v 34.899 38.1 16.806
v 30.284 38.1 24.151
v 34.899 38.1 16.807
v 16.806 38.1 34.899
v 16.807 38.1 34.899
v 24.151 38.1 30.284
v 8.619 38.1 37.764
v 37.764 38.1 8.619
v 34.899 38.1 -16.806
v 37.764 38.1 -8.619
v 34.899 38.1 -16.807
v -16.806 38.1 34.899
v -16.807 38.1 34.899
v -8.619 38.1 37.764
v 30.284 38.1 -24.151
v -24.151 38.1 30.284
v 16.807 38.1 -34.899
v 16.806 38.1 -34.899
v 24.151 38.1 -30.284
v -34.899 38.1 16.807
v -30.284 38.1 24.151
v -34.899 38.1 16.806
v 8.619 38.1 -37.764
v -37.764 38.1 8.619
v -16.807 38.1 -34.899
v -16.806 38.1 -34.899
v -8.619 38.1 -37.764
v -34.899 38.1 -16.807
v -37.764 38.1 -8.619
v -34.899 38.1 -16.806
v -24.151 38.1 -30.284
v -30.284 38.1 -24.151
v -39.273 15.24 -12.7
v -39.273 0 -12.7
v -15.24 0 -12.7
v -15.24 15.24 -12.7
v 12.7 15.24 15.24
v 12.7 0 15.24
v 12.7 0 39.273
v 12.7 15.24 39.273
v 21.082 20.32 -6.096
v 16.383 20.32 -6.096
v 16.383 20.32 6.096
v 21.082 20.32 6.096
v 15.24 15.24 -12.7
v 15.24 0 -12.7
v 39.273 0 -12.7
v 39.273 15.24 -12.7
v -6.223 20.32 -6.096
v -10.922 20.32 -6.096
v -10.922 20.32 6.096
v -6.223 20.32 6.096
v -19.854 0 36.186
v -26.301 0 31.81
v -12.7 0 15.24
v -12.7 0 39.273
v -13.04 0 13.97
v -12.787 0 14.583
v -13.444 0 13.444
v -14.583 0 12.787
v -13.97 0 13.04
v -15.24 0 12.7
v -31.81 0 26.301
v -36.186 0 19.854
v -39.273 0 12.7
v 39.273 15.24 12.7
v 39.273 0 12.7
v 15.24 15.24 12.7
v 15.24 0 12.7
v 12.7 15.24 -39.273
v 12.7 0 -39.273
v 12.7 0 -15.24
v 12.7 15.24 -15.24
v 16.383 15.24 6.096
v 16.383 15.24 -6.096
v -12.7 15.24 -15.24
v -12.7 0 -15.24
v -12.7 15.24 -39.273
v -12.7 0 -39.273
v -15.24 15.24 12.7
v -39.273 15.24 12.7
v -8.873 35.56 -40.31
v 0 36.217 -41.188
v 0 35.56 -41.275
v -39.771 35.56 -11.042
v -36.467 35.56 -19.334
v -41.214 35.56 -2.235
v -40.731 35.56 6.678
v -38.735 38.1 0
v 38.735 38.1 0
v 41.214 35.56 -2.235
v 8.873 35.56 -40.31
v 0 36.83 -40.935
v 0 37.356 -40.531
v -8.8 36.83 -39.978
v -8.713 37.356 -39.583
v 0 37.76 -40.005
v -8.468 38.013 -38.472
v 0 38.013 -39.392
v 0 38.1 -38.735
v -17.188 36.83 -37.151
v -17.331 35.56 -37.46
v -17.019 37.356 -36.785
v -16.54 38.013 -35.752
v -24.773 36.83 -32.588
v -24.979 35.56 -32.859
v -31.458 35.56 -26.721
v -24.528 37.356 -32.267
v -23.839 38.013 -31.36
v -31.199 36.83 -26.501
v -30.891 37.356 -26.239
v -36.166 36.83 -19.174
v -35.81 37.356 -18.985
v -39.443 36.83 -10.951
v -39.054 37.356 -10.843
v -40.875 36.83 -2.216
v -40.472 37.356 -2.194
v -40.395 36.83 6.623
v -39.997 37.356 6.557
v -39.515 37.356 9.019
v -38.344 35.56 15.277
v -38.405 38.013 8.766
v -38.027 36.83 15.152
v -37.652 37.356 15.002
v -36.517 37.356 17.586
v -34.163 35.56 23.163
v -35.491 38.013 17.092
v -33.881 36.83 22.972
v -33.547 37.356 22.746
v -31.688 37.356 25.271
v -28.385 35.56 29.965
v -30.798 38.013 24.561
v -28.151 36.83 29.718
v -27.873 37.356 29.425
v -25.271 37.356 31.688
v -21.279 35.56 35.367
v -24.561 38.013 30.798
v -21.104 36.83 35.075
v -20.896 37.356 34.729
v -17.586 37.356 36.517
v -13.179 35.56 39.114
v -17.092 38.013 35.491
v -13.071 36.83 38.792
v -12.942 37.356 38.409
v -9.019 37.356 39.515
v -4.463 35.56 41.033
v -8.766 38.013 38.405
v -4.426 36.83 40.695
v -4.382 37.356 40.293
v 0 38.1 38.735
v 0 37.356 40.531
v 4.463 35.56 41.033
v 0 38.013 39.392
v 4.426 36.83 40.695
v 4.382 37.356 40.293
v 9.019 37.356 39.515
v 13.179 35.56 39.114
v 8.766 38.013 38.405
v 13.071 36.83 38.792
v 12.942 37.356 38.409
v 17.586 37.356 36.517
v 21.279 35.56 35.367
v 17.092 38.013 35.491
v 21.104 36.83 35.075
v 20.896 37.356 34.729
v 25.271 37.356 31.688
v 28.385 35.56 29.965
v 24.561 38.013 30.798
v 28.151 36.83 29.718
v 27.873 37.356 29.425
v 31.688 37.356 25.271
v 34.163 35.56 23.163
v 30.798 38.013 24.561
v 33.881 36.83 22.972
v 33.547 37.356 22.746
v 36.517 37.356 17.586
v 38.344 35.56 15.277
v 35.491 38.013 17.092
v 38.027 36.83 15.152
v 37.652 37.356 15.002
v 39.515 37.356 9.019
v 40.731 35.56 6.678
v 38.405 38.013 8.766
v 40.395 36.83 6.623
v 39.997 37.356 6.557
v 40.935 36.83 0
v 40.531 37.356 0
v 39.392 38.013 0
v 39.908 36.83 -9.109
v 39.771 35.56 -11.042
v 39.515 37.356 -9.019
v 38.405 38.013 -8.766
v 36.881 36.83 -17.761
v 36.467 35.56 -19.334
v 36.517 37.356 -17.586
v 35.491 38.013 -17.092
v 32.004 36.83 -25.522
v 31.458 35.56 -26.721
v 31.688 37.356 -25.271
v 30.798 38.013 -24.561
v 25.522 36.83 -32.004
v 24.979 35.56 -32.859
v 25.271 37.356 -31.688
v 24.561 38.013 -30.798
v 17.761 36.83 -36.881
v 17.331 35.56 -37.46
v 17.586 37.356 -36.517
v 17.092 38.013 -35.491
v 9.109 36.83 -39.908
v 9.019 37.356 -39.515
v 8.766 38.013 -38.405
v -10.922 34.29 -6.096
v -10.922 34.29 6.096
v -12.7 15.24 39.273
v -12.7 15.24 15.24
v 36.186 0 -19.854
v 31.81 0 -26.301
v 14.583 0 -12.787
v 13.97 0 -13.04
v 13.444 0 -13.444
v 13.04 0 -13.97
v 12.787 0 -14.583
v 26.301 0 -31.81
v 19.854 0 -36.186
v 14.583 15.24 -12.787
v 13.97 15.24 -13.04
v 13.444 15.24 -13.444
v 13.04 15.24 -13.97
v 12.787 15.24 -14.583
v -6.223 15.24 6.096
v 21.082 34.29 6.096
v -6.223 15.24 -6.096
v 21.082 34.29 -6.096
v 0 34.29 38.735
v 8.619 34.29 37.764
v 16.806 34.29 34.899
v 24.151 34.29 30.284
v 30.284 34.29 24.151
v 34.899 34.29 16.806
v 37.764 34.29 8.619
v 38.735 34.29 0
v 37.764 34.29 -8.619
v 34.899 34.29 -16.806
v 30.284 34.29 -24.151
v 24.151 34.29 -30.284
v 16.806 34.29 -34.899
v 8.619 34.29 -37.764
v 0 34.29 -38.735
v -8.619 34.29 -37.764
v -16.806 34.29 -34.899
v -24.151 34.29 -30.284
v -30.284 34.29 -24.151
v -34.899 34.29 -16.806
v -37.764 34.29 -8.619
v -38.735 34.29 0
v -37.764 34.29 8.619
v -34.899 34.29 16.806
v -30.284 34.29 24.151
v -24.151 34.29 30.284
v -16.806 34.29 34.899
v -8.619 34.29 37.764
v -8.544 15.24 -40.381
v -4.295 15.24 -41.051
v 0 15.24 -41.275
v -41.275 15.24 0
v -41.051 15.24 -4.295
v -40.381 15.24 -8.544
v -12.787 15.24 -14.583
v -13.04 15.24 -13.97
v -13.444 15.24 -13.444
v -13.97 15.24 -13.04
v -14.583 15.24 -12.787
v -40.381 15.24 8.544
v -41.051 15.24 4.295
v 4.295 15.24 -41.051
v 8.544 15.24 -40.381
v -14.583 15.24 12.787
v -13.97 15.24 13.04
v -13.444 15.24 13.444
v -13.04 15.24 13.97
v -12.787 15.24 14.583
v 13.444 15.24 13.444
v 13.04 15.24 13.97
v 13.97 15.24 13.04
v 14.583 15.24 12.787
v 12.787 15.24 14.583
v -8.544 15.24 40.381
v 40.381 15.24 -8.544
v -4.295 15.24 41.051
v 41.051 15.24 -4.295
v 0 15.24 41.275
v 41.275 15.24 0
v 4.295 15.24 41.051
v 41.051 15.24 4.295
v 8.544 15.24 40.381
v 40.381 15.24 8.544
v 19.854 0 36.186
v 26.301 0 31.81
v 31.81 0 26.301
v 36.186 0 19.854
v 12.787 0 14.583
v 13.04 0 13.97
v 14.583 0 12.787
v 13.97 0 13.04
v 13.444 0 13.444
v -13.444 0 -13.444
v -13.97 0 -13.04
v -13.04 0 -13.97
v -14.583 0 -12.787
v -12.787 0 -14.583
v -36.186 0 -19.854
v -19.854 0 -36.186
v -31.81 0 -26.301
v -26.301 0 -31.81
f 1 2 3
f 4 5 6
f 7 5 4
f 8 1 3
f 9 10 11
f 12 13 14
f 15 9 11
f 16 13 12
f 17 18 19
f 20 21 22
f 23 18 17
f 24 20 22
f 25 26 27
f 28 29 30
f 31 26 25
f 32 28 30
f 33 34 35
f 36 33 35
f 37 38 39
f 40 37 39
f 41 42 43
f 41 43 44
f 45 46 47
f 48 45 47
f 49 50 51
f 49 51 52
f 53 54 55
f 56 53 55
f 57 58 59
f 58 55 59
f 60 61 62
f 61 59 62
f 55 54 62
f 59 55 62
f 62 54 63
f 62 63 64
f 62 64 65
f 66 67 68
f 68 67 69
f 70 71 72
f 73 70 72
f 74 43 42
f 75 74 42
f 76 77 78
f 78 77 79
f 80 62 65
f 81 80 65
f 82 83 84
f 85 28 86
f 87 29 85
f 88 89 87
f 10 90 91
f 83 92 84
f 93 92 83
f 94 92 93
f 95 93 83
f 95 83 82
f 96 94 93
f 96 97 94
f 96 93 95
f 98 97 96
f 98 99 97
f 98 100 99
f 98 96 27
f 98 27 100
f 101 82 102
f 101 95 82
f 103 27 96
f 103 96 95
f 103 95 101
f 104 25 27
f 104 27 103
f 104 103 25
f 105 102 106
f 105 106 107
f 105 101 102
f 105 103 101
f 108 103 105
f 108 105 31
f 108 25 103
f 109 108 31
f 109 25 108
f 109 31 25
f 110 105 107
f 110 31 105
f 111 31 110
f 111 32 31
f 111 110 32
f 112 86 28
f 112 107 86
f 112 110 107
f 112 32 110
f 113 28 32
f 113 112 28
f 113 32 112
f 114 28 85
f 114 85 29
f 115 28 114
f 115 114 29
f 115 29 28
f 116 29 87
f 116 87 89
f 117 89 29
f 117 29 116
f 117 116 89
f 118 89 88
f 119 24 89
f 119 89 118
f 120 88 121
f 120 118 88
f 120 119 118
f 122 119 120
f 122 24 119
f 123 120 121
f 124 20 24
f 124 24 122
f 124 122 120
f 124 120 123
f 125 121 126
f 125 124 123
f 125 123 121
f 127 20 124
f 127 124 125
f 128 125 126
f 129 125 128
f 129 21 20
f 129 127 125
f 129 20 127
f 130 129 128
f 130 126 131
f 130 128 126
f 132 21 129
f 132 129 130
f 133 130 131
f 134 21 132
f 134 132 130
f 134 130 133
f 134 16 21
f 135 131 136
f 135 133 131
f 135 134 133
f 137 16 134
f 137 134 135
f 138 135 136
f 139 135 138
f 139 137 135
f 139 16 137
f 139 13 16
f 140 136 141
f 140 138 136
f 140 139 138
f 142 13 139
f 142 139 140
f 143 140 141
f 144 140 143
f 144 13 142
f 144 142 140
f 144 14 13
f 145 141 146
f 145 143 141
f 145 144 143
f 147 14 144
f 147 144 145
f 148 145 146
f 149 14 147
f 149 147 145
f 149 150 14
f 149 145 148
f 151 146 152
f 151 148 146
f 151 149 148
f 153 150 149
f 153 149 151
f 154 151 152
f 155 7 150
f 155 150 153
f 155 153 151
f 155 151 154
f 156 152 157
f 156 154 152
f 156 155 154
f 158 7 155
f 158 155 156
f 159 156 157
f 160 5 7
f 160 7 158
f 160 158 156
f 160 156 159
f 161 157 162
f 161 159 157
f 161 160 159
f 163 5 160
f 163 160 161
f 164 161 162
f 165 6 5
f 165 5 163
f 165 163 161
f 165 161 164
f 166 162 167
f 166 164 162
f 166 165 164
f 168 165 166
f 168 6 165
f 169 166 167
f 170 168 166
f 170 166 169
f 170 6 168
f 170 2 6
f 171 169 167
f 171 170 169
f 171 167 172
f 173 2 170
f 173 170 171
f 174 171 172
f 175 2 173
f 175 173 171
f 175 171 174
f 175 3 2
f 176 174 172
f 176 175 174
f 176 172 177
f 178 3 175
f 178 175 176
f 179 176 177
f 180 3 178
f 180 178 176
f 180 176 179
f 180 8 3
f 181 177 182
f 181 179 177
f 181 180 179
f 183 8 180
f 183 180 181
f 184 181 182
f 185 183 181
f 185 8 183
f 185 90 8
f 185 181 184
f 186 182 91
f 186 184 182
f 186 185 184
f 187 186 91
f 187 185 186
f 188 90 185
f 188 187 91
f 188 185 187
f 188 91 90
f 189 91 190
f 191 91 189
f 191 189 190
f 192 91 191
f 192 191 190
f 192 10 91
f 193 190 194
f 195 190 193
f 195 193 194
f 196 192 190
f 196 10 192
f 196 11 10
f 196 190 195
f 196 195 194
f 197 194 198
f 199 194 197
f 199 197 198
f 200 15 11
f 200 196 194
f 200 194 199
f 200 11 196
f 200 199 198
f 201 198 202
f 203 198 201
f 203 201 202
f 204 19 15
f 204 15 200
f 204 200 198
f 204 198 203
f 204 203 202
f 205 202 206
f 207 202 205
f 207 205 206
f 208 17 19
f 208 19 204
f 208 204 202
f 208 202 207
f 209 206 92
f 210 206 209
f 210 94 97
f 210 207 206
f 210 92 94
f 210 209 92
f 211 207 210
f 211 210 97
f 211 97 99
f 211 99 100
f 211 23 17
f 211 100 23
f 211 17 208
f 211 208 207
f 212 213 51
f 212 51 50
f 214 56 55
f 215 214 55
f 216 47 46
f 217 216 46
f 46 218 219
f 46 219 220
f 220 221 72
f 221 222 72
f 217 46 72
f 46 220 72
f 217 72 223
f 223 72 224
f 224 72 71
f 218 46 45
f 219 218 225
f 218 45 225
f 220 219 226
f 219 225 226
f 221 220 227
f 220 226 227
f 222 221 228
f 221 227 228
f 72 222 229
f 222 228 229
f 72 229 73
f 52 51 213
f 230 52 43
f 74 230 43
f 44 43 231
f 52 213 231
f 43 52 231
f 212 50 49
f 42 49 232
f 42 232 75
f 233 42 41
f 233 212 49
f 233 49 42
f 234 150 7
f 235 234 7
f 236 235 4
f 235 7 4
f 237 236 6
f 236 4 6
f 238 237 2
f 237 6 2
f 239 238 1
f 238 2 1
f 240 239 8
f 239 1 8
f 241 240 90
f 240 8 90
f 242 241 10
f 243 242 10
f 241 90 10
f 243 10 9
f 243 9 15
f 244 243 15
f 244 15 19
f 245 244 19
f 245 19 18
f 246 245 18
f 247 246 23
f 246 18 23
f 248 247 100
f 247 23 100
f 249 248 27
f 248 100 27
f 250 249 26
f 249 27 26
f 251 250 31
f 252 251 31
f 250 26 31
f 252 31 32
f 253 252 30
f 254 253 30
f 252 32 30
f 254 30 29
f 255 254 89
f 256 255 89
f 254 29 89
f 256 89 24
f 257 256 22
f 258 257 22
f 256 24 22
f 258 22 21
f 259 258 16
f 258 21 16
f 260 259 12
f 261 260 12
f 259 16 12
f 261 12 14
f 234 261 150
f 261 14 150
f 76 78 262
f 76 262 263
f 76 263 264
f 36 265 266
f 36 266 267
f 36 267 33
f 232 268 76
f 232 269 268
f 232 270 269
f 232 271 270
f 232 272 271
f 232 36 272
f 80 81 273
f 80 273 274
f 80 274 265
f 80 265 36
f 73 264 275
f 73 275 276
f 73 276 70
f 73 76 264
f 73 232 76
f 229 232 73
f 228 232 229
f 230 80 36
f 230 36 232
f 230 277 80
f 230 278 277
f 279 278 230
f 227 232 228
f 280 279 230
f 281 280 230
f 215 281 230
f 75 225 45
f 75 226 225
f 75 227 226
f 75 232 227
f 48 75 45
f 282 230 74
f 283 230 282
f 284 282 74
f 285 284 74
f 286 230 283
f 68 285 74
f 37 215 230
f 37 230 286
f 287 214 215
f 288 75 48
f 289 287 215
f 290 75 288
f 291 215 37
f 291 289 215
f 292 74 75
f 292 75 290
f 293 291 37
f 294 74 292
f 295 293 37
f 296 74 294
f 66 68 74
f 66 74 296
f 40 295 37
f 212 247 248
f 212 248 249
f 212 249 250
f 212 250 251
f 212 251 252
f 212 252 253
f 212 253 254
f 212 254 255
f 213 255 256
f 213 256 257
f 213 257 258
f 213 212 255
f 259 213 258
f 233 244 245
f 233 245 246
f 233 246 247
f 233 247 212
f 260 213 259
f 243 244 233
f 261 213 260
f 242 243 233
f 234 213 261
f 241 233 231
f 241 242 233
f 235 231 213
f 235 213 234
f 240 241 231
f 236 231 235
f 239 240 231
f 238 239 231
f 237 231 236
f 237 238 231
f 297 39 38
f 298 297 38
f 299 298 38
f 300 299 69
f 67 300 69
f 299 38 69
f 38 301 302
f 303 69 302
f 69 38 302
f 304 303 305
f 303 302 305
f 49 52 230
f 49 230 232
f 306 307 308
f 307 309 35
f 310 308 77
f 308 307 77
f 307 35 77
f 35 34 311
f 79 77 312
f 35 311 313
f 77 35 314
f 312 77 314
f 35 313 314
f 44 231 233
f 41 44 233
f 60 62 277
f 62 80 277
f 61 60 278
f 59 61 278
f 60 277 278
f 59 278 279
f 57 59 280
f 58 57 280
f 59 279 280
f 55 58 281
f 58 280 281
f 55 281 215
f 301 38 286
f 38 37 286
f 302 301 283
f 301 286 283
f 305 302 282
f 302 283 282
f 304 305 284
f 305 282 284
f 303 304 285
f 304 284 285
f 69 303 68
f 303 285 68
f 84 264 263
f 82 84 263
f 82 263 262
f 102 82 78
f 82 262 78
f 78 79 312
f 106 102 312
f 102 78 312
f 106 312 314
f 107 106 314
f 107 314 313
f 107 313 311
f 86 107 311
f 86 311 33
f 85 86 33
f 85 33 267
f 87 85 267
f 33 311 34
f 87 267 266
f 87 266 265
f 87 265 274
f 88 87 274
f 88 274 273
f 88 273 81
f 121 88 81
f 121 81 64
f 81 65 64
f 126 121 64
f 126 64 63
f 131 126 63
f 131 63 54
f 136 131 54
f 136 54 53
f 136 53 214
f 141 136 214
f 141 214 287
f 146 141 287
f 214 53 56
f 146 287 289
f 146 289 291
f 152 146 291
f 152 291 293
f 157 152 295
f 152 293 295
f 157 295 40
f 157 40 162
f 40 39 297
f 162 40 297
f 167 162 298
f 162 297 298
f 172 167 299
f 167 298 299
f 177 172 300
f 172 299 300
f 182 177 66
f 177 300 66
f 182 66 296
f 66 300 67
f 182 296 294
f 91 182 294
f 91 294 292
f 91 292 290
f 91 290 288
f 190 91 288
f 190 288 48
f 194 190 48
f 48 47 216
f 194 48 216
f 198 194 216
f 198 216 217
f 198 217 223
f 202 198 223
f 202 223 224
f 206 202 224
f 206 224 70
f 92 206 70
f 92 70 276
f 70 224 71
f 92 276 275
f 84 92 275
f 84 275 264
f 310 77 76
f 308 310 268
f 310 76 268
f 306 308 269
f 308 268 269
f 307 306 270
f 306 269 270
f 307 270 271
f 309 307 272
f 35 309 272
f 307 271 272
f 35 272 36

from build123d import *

# Parameters (mm, degrees)
SKETCH2_R           = 41.275
BOSS_EXTRUDE2_DEPTH = 38.1
SKETCH3_R           = 38.735
CUT_EXTRUDE1_DEPTH  = 3.81
SKETCH4_W           = 25.4
SKETCH4_H           = 25.4
CUT_EXTRUDE2_DEPTH  = 15.24
SKETCH5_W           = 32.004
SKETCH5_H           = 12.192
CUT_EXTRUDE3_DEPTH  = 13.97
SKETCH6_W           = 22.606
SKETCH6_H           = 12.192
CUT_EXTRUDE4_DEPTH  = 62.807391548
FILLET1_R           = 2.54


with BuildPart() as part:
    # Sketch2 → Boss-Extrude2 (new body)
    with BuildSketch(Plane(origin=(0, 0, 0), x_dir=(1, 0, 0), z_dir=(0, 1, 0))):
        with Locations(Location((0, 0, 0), (0, 0, 90))):
            Circle(SKETCH2_R)
    extrude(amount=BOSS_EXTRUDE2_DEPTH)

    # Sketch3 → Cut-Extrude1 (cut)
    with BuildSketch(Plane(origin=(0, 38.1, 0), x_dir=(1, 0, 0), z_dir=(0, 1, 0))):
        with Locations(Location((0, 0, 0), (0, 0, 270))):
            Circle(SKETCH3_R)
    extrude(amount=-CUT_EXTRUDE1_DEPTH, mode=Mode.SUBTRACT)

    # Sketch4 → Cut-Extrude2 (cut)
    with BuildSketch(Plane.XZ):
        with BuildLine():
            ThreePointArc((-12.7, -39.272581084), (-6.428446216, -40.771322081), (-6e-08, -41.275))
            ThreePointArc((-6e-08, -41.275), (6.428446158, -40.77132209), (12.7, -39.272581084))
            Line((12.7, -39.272581084), (12.7, -12.7))
            Line((12.7, -12.7), (-12.7, -12.7))
            Line((-12.7, -12.7), (-12.7, -39.272581084))
        make_face()
        Rectangle(SKETCH4_W, SKETCH4_H)
        with BuildLine():
            Line((-12.7, 39.272581084), (-12.7, 12.7))
            Line((-12.7, 12.7), (12.7, 12.7))
            Line((12.7, 12.7), (12.7, 39.272581084))
            ThreePointArc((12.7, 39.272581084), (6.428446095, 40.7713221), (-1.86e-07, 41.275))
            ThreePointArc((-1.86e-07, 41.275), (-6.428446279, 40.771322071), (-12.7, 39.272581084))
        make_face()
        with BuildLine():
            Line((12.7, 12.7), (12.7, -12.7))
            Line((12.7, -12.7), (39.272581084, -12.7))
            ThreePointArc((39.272581084, -12.7), (40.771322086, -6.428446187), (41.275, 0))
            ThreePointArc((41.275, 0), (40.771322086, 6.428446187), (39.272581084, 12.7))
            Line((39.272581084, 12.7), (12.7, 12.7))
        make_face()
        with BuildLine():
            Line((-39.272581084, -12.7), (-12.7, -12.7))
            Line((-12.7, -12.7), (-12.7, 12.7))
            Line((-12.7, 12.7), (-39.272581084, 12.7))
            ThreePointArc((-39.272581084, 12.7), (-40.77132209, 6.428446159), (-41.275, -5.7e-08))
            ThreePointArc((-41.275, -5.7e-08), (-40.771322081, -6.428446215), (-39.272581084, -12.7))
        make_face()
    extrude(amount=-CUT_EXTRUDE2_DEPTH, mode=Mode.SUBTRACT)

    # Sketch5 → Cut-Extrude3 (cut)
    with BuildSketch(Plane(origin=(0, 34.29, 0), x_dir=(1, 0, 0), z_dir=(0, 1, 0))):
        with Locations((5.08, 0)):
            Rectangle(SKETCH5_W, SKETCH5_H)
    extrude(amount=-CUT_EXTRUDE3_DEPTH, mode=Mode.SUBTRACT)

    # Sketch6 → Cut-Extrude4 (cut, through all)
    with BuildSketch(Plane(origin=(0, 20.32, 0), x_dir=(1, 0, 0), z_dir=(0, 1, 0))):
        with Locations((5.08, 0)):
            Rectangle(SKETCH6_W, SKETCH6_H)
    extrude(amount=-CUT_EXTRUDE4_DEPTH, mode=Mode.SUBTRACT)

    # Fillet1
    fillet1_edges = [part.edges().sort_by_distance(p)[0] for p in [
        (12.7, 7.62, 12.7),
        (-12.7, 7.62, 12.7),
        (-12.7, 7.62, -12.7),
        (12.7, 7.62, -12.7),
        (0, 38.1, 41.275),
    ]]
    fillet(fillet1_edges, radius=FILLET1_R - 0.0001)  # a hair under: the kernel refuses the full size


solid = part.part
